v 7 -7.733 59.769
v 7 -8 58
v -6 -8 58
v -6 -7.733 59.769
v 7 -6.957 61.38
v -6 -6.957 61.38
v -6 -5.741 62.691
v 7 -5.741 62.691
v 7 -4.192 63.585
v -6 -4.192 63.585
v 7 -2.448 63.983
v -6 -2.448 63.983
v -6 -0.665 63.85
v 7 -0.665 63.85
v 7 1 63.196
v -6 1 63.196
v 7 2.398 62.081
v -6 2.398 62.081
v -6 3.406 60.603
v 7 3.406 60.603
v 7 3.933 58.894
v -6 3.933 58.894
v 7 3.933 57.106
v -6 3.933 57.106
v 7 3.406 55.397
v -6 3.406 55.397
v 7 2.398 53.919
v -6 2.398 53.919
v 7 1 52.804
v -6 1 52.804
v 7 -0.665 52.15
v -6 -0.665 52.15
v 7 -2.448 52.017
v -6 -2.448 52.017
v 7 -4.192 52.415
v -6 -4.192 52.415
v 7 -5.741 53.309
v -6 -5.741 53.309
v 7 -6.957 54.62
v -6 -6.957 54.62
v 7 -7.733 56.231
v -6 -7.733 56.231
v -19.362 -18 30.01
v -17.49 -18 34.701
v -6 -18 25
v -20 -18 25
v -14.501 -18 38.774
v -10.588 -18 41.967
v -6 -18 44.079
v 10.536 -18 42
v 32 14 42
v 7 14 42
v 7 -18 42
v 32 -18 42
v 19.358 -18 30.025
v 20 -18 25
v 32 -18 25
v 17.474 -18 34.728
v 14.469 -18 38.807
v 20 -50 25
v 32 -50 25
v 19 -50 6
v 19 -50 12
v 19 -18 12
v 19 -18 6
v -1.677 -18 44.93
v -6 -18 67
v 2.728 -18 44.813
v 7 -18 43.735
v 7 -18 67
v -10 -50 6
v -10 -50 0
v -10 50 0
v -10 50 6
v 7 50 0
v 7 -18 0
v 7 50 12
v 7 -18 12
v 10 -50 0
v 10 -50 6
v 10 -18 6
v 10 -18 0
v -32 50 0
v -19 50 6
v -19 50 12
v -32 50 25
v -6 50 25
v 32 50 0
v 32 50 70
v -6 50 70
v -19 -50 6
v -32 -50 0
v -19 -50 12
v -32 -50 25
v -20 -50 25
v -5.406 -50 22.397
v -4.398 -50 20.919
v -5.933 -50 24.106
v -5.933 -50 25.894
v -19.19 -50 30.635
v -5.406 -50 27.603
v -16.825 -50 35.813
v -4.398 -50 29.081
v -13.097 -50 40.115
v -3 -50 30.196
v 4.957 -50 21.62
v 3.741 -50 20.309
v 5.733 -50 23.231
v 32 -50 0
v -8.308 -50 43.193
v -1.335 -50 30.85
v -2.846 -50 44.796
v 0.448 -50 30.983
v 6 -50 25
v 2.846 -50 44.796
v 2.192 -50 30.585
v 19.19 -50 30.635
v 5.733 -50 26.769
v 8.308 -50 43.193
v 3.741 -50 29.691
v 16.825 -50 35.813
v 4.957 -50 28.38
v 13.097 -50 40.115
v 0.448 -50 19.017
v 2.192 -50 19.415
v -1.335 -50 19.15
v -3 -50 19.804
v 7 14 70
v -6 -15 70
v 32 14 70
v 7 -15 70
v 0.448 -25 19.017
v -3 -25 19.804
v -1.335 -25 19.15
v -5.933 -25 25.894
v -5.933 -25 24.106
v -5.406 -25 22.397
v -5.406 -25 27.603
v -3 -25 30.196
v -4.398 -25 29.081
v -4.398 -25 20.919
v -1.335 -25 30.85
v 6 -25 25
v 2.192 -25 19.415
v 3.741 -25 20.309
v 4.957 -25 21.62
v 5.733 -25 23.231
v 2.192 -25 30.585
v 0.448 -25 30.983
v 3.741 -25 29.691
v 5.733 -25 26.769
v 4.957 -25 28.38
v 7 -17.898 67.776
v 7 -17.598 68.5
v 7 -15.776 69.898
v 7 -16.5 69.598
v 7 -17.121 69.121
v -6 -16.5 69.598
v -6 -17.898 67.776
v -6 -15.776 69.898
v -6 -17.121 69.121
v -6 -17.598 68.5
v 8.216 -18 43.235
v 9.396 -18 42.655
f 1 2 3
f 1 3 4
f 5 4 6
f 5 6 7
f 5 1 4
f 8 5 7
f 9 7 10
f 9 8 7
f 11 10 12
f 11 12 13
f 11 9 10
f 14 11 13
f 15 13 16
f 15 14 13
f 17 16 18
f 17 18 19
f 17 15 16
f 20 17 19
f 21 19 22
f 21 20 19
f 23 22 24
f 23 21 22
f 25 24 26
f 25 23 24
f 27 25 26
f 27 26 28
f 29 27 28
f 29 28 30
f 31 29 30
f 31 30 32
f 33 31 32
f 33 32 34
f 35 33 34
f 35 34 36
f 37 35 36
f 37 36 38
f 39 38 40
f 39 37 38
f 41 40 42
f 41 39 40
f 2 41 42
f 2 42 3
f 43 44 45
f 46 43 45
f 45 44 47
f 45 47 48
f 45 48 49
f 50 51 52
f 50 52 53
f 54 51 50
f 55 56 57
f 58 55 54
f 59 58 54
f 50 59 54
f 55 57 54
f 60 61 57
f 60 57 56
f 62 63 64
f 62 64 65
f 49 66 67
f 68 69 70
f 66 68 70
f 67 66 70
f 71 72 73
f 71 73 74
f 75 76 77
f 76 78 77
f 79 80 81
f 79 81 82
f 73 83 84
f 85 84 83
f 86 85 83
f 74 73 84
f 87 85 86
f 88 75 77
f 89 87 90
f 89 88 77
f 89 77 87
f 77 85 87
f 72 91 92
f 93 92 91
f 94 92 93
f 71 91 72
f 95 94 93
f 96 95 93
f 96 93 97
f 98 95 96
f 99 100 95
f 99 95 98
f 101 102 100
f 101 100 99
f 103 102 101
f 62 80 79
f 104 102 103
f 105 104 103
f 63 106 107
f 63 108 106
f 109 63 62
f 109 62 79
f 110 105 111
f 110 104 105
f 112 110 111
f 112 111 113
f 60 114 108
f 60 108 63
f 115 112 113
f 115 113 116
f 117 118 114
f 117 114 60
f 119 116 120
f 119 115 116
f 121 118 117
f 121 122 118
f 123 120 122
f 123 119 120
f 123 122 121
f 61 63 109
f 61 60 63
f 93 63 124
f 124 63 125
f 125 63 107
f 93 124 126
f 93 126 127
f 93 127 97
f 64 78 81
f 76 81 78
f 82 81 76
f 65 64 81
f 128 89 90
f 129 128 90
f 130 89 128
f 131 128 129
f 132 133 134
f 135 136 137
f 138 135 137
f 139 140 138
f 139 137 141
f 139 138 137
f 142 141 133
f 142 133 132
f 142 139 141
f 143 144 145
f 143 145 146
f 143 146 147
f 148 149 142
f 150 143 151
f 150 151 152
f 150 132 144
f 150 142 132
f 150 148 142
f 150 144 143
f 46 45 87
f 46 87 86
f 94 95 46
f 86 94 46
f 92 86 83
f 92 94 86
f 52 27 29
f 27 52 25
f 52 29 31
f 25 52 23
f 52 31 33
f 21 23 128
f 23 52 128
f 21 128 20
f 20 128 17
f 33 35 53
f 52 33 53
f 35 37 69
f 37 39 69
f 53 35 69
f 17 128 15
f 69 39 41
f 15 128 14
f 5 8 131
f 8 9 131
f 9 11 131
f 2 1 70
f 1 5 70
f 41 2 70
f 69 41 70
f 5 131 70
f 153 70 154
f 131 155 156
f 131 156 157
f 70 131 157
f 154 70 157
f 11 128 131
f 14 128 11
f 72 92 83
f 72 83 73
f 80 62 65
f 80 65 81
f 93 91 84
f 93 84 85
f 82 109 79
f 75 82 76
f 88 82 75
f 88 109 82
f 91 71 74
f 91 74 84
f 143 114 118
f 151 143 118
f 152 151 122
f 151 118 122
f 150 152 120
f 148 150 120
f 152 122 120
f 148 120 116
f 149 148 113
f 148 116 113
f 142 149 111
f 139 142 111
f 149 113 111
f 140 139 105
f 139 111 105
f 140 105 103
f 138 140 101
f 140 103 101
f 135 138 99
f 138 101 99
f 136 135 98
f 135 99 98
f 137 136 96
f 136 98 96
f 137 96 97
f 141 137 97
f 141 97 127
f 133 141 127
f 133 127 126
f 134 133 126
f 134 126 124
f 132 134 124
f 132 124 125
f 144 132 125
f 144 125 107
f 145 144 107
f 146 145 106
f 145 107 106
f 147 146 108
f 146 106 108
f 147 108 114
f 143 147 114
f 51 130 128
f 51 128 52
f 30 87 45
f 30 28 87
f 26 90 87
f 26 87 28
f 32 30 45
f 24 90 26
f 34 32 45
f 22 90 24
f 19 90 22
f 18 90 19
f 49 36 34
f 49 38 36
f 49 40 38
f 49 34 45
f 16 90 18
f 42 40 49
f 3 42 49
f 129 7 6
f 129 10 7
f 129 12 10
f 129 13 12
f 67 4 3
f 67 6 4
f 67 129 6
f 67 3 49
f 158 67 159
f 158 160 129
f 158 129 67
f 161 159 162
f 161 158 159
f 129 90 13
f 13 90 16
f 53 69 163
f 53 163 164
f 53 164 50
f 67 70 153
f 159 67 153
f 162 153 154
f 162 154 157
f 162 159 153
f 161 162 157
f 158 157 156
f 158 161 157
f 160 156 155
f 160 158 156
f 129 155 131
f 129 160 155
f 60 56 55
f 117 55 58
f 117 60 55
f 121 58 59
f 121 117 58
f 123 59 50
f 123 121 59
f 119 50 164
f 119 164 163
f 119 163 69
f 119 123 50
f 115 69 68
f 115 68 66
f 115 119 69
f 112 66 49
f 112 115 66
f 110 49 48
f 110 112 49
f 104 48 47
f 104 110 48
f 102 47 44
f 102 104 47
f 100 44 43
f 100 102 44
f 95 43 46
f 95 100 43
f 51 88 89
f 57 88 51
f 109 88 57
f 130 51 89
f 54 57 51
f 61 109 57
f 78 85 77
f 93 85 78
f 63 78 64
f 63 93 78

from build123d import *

# Parameters (mm, degrees)
F1_DEPTH  = 50
F3_DEPTH  = 25
F4_W      = 68
F4_H      = 45
F4_R      = 6
F5_DEPTH  = 13
F6_R      = 3
F8_DEPTH  = 32
F9_R      = 6
F10_DEPTH = 25


with BuildPart() as f1:
    # F0 (on Front) → F1 (new body, symmetric)
    with BuildSketch(Plane.XZ):
        Polygon((-32, 25), (-32, 0), (-10, 0), (-10, 6), (-19, 6), (-19, 12), (19, 12), (19, 6), (10, 6), (10, 0), (32, 0), (32, 25), align=None)
    extrude(amount=F1_DEPTH, both=True)

    # F2 (on face) → F3 (join)
    with BuildSketch(Plane.YZ.offset(32)):
        Polygon((50, 0), (50, 25), (50, 70), (14, 70), (14, 42), (-18, 42), (-18, 25), (-18, 0), align=None)
    extrude(amount=-F3_DEPTH)

    # F4 (on face) → F5 (join)
    with BuildSketch(Plane(origin=(7, 0, 0), x_dir=(0, -1, 0), z_dir=(-1, 0, 0))):
        with Locations((-16, 47.5)):
            Rectangle(F4_W, F4_H)
        with Locations((2, 58)):
            Circle(F4_R, mode=Mode.SUBTRACT)
    extrude(amount=F5_DEPTH)

    # F6
    f6_edges = [f1.edges().sort_by_distance(p)[0] for p in [
        (0.5, -18, 70),
    ]]
    fillet(f6_edges, radius=F6_R)

    # F7 (on face) → F8 (join)
    with BuildSketch(Plane.XZ.offset(50)):
        with BuildLine():
            Line((6, 25), (20, 25))
            ThreePointArc((20, 25), (0, 45), (-20, 25))
            Line((-20, 25), (-6, 25))
            ThreePointArc((-6, 25), (0, 31), (6, 25))
        make_face()
        with BuildLine():
            Line((-6, 25), (6, 25))
            ThreePointArc((6, 25), (0, 31), (-6, 25))
        make_face()
        with BuildLine():
            ThreePointArc((-6, 25), (0, 19), (6, 25))
            Line((6, 25), (-6, 25))
        make_face()
    extrude(amount=-F8_DEPTH)

    # F9 (on face) → F10 (cut)
    with BuildSketch(Plane.XZ.offset(50)):
        with Locations((0, 25)):
            Circle(F9_R)
    extrude(amount=-F10_DEPTH, mode=Mode.SUBTRACT)


solid = f1.part
